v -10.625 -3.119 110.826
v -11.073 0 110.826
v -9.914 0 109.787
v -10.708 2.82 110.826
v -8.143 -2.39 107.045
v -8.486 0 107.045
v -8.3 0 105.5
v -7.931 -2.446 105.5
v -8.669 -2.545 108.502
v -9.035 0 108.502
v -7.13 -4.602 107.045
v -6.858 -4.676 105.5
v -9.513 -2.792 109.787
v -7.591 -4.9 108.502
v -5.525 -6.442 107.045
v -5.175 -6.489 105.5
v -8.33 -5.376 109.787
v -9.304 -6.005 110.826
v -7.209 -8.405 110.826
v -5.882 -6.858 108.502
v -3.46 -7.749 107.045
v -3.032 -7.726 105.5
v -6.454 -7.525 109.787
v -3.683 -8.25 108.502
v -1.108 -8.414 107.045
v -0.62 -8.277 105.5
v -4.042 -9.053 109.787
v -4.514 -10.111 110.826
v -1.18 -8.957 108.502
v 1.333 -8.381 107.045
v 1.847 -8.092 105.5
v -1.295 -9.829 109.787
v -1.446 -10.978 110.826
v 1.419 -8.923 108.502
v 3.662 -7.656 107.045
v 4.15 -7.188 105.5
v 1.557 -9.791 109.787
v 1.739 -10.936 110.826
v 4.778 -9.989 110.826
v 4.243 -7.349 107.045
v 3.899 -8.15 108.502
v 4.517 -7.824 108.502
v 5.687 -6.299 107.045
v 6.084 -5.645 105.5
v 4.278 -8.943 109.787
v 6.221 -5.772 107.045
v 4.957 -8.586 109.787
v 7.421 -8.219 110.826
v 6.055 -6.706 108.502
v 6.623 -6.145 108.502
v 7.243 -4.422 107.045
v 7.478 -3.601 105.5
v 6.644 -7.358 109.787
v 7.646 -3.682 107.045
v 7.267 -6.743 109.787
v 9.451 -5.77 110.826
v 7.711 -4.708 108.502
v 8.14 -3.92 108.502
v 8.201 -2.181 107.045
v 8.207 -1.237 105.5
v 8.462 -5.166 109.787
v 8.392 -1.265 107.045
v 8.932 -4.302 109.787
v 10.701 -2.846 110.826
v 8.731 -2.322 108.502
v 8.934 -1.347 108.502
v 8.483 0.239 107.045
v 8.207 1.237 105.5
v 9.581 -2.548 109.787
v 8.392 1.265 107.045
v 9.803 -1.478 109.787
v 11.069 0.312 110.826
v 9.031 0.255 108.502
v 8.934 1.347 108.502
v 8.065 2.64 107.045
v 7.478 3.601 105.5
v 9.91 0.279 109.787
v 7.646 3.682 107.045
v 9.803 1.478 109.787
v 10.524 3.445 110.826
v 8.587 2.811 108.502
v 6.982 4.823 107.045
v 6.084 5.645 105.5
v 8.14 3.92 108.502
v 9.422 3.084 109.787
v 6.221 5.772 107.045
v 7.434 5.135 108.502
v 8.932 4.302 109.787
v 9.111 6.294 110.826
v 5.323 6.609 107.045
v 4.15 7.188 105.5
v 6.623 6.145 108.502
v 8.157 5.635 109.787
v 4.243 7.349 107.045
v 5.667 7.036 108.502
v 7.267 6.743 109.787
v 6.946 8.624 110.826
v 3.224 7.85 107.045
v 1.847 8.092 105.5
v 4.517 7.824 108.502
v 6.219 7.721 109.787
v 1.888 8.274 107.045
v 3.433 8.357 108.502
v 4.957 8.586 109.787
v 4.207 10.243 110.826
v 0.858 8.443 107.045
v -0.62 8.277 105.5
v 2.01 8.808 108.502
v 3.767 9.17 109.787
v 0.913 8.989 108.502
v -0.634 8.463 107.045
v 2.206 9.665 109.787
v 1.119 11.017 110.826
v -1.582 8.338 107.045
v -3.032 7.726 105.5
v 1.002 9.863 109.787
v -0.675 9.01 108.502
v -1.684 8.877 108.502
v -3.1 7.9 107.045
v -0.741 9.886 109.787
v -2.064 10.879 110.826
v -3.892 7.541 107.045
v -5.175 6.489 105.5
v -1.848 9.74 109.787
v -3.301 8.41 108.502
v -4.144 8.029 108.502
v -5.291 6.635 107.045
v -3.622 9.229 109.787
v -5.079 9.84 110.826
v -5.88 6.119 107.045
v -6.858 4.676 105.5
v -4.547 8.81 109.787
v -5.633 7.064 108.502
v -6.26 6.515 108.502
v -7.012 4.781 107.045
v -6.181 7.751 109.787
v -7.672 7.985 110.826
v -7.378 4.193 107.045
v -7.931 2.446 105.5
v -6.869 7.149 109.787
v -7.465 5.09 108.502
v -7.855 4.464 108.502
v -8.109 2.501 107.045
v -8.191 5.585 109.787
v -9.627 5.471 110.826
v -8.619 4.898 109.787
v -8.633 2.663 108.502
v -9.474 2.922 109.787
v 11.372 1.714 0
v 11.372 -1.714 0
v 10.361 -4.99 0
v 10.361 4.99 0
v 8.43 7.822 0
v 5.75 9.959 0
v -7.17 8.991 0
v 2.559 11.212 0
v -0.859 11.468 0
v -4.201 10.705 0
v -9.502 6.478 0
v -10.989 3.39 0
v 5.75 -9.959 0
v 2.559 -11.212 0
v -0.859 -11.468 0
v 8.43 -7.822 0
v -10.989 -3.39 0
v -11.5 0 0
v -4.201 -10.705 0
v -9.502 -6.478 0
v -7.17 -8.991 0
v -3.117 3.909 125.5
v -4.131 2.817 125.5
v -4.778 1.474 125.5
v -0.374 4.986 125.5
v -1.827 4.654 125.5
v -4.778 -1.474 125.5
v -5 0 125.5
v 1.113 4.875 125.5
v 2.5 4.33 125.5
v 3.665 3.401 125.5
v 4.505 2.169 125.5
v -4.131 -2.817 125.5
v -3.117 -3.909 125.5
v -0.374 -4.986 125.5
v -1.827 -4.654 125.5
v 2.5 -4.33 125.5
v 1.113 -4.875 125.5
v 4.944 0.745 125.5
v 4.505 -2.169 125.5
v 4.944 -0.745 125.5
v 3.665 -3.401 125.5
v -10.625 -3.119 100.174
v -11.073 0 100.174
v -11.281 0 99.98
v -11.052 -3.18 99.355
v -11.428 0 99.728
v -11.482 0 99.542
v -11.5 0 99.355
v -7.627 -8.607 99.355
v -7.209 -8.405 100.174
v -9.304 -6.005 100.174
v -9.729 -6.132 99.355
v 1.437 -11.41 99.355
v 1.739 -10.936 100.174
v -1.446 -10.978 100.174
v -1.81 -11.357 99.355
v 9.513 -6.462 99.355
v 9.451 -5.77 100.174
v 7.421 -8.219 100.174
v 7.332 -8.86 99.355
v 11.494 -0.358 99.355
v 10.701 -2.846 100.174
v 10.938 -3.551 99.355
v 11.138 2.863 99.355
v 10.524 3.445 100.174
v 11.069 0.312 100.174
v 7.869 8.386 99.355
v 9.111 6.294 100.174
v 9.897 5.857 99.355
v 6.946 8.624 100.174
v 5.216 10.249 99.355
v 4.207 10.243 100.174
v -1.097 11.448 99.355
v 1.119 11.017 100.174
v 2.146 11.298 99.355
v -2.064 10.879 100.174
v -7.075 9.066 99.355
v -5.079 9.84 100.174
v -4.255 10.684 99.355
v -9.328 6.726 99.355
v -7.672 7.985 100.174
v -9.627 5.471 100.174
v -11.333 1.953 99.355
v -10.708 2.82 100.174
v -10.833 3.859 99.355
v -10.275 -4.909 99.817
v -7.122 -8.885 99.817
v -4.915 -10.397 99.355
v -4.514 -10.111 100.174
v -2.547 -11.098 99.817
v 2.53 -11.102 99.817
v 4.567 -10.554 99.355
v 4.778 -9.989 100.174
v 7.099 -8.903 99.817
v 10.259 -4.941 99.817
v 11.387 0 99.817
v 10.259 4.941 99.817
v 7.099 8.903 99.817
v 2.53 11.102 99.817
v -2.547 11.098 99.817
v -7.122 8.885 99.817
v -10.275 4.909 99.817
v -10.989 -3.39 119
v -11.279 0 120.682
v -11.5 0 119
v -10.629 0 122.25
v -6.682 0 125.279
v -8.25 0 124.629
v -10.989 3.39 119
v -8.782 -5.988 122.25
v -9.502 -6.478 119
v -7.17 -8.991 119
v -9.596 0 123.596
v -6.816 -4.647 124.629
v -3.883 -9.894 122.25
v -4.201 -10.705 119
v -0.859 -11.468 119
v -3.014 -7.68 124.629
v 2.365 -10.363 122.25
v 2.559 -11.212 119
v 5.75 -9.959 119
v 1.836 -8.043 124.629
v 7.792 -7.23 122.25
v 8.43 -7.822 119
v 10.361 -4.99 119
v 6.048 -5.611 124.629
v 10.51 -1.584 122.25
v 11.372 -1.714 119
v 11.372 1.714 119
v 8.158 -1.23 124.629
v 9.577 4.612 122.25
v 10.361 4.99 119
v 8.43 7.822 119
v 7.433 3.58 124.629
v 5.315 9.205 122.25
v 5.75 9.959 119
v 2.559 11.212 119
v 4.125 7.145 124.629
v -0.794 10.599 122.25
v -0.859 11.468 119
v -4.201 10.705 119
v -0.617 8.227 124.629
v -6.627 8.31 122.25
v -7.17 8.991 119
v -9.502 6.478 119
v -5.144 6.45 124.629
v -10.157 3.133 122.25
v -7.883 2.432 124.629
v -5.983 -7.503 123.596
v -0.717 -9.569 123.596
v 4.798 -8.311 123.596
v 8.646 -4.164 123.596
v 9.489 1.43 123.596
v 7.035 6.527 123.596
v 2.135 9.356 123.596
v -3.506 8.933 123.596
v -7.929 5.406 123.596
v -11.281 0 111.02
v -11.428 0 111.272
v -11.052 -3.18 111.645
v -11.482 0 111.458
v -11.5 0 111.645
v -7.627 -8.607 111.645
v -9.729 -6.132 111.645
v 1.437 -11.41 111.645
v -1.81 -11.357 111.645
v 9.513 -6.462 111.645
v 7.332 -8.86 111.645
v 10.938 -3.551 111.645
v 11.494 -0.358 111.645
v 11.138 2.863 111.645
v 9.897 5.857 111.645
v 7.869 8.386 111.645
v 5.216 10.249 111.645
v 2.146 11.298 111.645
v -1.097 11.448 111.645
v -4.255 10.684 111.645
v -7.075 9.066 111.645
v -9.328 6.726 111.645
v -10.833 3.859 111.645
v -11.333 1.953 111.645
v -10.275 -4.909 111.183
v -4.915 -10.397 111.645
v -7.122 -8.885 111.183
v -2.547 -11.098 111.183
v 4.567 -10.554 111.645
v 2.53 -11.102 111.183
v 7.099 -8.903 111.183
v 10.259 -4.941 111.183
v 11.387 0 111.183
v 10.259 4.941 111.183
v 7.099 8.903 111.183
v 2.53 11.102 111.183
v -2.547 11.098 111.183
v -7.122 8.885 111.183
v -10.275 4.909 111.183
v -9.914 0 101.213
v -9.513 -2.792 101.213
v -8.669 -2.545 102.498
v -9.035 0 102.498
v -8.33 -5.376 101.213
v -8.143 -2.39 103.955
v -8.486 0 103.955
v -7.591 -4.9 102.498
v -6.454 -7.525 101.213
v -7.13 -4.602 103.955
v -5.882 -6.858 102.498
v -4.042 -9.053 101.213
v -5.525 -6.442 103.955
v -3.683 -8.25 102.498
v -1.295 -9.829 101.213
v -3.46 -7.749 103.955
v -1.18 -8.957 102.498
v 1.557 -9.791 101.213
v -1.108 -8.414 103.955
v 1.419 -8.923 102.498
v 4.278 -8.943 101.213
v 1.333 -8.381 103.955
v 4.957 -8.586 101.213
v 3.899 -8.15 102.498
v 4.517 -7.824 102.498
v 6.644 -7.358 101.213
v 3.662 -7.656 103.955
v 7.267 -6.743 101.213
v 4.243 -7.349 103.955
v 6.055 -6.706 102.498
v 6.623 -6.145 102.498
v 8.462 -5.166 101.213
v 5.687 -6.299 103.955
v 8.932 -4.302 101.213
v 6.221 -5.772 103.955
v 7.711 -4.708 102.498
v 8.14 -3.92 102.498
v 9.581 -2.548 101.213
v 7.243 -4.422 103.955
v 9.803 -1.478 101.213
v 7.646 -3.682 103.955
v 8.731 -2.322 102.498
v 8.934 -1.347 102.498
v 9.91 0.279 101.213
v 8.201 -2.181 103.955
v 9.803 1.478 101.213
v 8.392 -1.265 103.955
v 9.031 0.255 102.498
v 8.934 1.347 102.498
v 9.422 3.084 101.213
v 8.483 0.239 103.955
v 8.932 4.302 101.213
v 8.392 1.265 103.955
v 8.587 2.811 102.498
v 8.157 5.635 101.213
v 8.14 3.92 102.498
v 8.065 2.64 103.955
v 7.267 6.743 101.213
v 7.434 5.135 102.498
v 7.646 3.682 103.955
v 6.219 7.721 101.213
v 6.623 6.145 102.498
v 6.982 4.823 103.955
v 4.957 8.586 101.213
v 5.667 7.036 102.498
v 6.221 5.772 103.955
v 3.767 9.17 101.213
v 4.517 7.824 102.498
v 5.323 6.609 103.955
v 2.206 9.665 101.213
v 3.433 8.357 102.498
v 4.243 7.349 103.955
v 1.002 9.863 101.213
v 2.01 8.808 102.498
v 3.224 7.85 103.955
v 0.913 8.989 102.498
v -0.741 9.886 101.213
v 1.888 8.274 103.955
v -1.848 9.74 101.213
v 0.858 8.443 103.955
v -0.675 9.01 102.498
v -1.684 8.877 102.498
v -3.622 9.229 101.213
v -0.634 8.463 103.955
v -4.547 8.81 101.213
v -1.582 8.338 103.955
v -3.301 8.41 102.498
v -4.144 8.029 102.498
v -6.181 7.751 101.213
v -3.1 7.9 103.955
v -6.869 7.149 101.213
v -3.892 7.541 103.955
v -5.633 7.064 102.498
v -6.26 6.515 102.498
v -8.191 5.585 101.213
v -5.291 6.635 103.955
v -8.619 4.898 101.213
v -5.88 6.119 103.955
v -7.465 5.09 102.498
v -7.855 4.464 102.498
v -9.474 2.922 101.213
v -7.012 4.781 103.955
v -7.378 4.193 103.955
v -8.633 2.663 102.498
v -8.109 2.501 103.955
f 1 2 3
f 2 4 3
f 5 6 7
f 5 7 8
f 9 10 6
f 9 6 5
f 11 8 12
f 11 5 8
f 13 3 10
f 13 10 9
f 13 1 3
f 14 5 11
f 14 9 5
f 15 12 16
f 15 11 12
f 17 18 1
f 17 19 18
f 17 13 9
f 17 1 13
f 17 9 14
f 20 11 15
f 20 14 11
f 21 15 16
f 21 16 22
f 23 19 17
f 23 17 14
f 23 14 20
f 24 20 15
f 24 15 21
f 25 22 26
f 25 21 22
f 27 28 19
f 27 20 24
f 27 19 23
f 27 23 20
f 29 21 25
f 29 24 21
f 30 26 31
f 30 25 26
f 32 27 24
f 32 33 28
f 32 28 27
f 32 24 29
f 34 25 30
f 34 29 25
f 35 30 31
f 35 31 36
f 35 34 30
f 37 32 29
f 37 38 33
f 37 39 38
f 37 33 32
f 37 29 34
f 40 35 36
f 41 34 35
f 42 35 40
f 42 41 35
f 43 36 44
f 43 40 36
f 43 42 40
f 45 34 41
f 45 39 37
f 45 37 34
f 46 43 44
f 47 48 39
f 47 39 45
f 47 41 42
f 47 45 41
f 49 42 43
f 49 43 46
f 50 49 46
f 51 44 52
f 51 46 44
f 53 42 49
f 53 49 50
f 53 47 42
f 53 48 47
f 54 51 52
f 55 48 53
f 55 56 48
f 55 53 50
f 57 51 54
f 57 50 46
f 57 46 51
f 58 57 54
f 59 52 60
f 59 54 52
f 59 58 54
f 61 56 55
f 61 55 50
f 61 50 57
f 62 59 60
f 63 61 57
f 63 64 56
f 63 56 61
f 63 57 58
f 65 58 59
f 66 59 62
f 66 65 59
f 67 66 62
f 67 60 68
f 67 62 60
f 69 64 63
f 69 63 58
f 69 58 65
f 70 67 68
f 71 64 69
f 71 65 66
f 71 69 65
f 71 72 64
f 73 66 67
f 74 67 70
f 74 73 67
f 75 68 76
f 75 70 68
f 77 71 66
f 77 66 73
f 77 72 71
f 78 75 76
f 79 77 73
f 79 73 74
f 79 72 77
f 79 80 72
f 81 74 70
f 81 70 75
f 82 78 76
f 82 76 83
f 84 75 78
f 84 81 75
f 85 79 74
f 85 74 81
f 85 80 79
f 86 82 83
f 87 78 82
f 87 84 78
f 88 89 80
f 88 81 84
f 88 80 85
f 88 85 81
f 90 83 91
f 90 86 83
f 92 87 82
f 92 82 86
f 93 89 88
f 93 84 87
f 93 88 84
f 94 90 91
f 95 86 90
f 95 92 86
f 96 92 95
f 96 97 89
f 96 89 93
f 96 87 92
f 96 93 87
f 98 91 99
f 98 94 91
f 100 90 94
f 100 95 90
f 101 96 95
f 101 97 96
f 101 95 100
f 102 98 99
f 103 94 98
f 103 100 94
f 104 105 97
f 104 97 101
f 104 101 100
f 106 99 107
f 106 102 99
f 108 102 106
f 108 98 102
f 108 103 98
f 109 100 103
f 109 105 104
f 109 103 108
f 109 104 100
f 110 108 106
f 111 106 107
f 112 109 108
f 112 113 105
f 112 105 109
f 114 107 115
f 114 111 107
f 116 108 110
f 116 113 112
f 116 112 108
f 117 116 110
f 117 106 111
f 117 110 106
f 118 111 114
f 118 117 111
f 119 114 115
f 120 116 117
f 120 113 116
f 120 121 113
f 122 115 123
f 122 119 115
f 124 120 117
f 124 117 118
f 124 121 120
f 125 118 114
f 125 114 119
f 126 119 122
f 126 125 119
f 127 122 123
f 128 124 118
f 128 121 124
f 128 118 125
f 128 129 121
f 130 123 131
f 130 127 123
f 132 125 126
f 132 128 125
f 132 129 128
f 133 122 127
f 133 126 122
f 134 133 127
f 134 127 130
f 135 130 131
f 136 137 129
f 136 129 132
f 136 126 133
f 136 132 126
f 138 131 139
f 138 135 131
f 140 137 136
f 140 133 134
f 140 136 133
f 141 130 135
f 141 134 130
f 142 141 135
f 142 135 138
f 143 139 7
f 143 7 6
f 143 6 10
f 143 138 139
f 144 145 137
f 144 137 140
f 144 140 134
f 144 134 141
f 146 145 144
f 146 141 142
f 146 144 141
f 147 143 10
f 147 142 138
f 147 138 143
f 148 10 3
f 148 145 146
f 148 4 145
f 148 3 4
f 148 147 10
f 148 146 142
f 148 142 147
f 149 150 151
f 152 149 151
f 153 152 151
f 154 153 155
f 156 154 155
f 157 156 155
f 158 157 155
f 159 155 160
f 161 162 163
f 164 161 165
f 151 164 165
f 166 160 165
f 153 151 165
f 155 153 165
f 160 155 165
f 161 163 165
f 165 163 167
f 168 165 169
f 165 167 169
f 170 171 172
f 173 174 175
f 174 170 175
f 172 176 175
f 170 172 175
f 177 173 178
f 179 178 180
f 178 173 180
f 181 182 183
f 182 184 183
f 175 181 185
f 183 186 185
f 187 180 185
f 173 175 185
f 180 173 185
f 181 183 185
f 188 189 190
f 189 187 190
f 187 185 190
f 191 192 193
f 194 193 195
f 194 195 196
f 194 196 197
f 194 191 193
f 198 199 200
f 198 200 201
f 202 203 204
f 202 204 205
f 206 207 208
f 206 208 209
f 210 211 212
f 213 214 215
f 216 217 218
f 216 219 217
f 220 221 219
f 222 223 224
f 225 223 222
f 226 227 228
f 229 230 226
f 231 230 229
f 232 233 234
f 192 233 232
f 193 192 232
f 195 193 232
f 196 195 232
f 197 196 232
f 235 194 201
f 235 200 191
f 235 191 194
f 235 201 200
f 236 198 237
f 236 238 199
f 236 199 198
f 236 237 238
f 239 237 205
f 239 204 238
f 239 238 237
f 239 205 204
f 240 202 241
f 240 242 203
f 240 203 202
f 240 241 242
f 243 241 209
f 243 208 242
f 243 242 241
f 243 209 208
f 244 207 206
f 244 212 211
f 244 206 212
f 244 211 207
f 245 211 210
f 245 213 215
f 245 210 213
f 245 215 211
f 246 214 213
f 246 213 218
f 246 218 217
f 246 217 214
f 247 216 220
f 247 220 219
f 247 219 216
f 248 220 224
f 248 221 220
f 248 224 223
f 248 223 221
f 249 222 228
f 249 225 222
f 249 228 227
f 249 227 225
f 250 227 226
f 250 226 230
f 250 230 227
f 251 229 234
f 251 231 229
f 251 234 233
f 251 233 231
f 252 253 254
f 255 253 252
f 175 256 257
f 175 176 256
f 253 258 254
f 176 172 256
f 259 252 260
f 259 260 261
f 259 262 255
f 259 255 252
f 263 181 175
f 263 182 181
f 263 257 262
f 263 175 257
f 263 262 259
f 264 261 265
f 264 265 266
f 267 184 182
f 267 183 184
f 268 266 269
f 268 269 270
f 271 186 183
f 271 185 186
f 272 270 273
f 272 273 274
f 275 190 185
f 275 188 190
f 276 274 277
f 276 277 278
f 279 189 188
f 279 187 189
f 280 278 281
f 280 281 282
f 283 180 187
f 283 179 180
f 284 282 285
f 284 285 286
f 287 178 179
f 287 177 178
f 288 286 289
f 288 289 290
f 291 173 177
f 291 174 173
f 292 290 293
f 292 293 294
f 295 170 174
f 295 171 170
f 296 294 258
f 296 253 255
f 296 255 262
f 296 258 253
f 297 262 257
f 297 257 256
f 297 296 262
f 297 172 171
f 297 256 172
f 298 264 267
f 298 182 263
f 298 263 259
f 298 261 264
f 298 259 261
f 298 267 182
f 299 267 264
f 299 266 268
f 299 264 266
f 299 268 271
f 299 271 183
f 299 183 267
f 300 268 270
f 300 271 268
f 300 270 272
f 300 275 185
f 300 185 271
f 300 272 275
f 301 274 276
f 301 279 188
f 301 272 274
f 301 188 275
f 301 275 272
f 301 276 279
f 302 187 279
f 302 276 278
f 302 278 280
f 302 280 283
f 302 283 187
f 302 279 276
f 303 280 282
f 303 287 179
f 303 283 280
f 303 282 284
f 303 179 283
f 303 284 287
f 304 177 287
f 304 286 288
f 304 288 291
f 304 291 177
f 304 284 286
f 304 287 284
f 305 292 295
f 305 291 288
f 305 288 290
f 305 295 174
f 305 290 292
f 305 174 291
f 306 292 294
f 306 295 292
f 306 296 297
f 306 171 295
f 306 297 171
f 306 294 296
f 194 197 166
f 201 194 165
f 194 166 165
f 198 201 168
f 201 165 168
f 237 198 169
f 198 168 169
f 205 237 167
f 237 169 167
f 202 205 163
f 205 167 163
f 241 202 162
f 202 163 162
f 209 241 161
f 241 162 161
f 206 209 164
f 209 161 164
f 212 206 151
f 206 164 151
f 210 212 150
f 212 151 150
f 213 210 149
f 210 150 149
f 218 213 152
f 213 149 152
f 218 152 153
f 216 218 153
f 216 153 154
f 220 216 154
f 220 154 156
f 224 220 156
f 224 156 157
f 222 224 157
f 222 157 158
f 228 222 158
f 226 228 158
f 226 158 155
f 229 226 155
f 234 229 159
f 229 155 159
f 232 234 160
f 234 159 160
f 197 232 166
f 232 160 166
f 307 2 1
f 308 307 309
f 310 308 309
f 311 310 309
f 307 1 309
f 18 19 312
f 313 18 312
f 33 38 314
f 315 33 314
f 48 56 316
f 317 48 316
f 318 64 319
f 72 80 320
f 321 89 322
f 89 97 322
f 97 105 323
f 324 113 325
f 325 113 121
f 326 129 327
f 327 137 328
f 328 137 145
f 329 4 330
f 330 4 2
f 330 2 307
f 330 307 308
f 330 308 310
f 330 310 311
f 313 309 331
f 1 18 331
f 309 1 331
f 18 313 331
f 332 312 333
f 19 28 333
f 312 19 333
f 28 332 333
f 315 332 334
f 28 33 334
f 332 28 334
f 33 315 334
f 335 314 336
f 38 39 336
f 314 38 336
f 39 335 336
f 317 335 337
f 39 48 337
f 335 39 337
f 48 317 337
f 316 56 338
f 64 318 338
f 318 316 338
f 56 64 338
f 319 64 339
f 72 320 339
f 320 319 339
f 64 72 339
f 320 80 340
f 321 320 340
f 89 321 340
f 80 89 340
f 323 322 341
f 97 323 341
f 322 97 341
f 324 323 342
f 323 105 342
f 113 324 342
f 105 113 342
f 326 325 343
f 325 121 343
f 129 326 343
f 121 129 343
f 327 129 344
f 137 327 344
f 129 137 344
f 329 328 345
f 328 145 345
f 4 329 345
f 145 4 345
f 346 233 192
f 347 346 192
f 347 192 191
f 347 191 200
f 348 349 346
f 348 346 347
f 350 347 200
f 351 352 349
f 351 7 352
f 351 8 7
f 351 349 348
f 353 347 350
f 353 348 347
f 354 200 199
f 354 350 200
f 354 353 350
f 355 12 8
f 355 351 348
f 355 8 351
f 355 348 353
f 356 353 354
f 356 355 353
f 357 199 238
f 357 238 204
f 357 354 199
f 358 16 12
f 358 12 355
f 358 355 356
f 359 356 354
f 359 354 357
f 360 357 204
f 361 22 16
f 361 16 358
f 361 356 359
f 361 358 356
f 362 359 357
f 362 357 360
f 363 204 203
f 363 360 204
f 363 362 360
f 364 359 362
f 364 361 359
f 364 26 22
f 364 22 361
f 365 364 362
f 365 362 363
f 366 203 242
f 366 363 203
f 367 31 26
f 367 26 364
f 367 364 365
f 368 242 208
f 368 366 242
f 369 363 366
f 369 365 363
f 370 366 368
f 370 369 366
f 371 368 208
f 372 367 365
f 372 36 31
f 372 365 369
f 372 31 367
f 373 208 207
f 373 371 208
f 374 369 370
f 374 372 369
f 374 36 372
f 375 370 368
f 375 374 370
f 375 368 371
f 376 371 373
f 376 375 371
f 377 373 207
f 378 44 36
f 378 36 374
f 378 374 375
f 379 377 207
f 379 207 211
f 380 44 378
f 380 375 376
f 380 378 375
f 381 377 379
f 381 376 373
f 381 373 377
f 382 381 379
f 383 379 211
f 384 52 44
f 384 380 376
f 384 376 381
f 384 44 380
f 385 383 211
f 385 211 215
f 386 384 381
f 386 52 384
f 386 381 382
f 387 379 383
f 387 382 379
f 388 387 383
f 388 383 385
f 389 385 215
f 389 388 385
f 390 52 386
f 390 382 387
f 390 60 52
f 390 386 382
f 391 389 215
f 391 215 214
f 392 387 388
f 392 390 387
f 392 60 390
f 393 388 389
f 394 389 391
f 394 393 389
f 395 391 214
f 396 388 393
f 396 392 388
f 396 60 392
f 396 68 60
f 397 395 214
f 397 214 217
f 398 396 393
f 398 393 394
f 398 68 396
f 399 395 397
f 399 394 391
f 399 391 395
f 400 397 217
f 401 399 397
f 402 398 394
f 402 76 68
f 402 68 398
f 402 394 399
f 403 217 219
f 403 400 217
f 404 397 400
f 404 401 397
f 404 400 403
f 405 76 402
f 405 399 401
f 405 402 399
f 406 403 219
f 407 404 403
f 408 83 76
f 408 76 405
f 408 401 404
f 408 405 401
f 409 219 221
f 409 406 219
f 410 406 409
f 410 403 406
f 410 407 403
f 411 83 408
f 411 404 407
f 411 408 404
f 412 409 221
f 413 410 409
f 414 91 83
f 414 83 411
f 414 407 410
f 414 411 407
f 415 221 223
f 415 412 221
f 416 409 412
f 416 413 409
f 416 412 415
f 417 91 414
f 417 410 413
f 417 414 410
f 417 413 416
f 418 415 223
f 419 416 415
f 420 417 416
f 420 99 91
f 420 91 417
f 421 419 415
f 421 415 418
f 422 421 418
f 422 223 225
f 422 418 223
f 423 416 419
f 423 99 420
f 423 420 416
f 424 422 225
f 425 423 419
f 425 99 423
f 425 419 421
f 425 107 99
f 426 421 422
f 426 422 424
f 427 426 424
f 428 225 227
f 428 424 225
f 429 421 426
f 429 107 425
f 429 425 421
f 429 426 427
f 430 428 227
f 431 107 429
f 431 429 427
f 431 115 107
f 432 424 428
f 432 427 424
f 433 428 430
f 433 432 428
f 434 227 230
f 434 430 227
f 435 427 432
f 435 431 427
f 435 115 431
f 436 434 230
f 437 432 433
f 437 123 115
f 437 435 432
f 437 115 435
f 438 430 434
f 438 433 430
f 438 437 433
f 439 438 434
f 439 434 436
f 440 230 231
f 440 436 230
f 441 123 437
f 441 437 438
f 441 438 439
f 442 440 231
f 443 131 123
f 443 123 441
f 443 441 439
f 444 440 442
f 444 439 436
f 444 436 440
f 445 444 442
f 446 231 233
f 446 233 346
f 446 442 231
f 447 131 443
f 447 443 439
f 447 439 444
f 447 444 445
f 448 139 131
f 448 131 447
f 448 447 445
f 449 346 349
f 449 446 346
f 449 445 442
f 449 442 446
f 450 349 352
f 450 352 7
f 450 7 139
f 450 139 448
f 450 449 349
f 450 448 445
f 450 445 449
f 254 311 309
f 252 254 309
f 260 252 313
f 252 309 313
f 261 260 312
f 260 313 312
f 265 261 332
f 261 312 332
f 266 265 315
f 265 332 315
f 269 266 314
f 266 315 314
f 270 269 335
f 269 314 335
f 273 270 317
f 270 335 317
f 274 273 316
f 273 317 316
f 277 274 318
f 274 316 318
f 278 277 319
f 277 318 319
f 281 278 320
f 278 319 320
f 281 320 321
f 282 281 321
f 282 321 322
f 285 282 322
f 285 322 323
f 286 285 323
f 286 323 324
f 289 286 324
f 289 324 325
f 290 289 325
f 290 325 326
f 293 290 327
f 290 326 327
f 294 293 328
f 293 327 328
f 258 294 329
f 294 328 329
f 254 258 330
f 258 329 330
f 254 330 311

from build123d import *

# Parameters (mm, degrees)
F3_R = 1


# Not quite as in the source:
# - a fillet or chamfer that OpenCascade refuses, or shapes differently, is made with other operations: its cross-section is extruded or revolved along the edge and cut away or added


with BuildPart() as f1:
    # F0 (on Front) → F1 (revolve)
    with BuildSketch(Plane.XZ):
        with BuildLine():
            Line((-11.5, 0), (0, 0))
            Line((0, 0), (0, 125.5))
            Line((0, 125.5), (-11.5, 125.5))
            Line((-11.5, 125.5), (-11.5, 111.1))
            ThreePointArc((-11.5, 111.1), (-11.4175796144, 111.0506064835), (-11.3358983849, 111))
            Line((-11.3358983849, 111), (-8.3, 111))
            Line((-8.3, 111), (-8.3, 105.5))
            Line((-8.3, 105.5), (-8.3, 100))
            Line((-8.3, 100), (-11.3358983849, 100))
            ThreePointArc((-11.3358983849, 100), (-11.4175796144, 99.9493935165), (-11.5, 99.9))
            Line((-11.5, 99.9), (-11.5, 0))
        make_face()
    revolve(axis=Axis((0, 0, 62.75), (0, 0, 1)))

    # F2: fillet of radius 6.5 on 3 edges, made by hand

    # F2_s1 → F2_t2 (revolve, cut)
    with BuildSketch(Plane.XZ):
        with BuildLine():
            ThreePointArc((-11.5, 119), (-9.5961940777, 123.5961940777), (-5, 125.5))
            Line((-5, 125.5), (-11.5, 125.5))
            Line((-11.5, 125.5), (-11.5, 119))
        make_face()
    revolve(axis=Axis((0, 0, 125.5), (0, 0, 1)), mode=Mode.SUBTRACT)

    # F2_s3 → F2_t4 (revolve)
    with BuildSketch(Plane.XZ):
        with BuildLine():
            ThreePointArc((-8.3, 105.5), (-9.1093646884, 108.6411255548), (-11.3358983849, 111))
            Line((-11.3358983849, 111), (-8.3, 111))
            Line((-8.3, 111), (-8.3, 105.5))
        make_face()
    revolve(axis=Axis((0, 0, 111), (0, 0, 1)))

    # F2_s5 → F2_t6 (revolve)
    with BuildSketch(Plane.XZ):
        with BuildLine():
            ThreePointArc((-11.3358983849, 100), (-9.1093646884, 102.3588744452), (-8.3, 105.5))
            Line((-8.3, 105.5), (-8.3, 100))
            Line((-8.3, 100), (-11.3358983849, 100))
        make_face()
    revolve(axis=Axis((0, 0, 100), (0, 0, 1)))

    # F3
    f3_edges = [f1.edges().sort_by_distance(p)[0] for p in [
        (11.5, 0, 111.1),
        (11.5, 0, 99.9),
    ]]
    fillet(f3_edges, radius=F3_R)


solid = f1.part
